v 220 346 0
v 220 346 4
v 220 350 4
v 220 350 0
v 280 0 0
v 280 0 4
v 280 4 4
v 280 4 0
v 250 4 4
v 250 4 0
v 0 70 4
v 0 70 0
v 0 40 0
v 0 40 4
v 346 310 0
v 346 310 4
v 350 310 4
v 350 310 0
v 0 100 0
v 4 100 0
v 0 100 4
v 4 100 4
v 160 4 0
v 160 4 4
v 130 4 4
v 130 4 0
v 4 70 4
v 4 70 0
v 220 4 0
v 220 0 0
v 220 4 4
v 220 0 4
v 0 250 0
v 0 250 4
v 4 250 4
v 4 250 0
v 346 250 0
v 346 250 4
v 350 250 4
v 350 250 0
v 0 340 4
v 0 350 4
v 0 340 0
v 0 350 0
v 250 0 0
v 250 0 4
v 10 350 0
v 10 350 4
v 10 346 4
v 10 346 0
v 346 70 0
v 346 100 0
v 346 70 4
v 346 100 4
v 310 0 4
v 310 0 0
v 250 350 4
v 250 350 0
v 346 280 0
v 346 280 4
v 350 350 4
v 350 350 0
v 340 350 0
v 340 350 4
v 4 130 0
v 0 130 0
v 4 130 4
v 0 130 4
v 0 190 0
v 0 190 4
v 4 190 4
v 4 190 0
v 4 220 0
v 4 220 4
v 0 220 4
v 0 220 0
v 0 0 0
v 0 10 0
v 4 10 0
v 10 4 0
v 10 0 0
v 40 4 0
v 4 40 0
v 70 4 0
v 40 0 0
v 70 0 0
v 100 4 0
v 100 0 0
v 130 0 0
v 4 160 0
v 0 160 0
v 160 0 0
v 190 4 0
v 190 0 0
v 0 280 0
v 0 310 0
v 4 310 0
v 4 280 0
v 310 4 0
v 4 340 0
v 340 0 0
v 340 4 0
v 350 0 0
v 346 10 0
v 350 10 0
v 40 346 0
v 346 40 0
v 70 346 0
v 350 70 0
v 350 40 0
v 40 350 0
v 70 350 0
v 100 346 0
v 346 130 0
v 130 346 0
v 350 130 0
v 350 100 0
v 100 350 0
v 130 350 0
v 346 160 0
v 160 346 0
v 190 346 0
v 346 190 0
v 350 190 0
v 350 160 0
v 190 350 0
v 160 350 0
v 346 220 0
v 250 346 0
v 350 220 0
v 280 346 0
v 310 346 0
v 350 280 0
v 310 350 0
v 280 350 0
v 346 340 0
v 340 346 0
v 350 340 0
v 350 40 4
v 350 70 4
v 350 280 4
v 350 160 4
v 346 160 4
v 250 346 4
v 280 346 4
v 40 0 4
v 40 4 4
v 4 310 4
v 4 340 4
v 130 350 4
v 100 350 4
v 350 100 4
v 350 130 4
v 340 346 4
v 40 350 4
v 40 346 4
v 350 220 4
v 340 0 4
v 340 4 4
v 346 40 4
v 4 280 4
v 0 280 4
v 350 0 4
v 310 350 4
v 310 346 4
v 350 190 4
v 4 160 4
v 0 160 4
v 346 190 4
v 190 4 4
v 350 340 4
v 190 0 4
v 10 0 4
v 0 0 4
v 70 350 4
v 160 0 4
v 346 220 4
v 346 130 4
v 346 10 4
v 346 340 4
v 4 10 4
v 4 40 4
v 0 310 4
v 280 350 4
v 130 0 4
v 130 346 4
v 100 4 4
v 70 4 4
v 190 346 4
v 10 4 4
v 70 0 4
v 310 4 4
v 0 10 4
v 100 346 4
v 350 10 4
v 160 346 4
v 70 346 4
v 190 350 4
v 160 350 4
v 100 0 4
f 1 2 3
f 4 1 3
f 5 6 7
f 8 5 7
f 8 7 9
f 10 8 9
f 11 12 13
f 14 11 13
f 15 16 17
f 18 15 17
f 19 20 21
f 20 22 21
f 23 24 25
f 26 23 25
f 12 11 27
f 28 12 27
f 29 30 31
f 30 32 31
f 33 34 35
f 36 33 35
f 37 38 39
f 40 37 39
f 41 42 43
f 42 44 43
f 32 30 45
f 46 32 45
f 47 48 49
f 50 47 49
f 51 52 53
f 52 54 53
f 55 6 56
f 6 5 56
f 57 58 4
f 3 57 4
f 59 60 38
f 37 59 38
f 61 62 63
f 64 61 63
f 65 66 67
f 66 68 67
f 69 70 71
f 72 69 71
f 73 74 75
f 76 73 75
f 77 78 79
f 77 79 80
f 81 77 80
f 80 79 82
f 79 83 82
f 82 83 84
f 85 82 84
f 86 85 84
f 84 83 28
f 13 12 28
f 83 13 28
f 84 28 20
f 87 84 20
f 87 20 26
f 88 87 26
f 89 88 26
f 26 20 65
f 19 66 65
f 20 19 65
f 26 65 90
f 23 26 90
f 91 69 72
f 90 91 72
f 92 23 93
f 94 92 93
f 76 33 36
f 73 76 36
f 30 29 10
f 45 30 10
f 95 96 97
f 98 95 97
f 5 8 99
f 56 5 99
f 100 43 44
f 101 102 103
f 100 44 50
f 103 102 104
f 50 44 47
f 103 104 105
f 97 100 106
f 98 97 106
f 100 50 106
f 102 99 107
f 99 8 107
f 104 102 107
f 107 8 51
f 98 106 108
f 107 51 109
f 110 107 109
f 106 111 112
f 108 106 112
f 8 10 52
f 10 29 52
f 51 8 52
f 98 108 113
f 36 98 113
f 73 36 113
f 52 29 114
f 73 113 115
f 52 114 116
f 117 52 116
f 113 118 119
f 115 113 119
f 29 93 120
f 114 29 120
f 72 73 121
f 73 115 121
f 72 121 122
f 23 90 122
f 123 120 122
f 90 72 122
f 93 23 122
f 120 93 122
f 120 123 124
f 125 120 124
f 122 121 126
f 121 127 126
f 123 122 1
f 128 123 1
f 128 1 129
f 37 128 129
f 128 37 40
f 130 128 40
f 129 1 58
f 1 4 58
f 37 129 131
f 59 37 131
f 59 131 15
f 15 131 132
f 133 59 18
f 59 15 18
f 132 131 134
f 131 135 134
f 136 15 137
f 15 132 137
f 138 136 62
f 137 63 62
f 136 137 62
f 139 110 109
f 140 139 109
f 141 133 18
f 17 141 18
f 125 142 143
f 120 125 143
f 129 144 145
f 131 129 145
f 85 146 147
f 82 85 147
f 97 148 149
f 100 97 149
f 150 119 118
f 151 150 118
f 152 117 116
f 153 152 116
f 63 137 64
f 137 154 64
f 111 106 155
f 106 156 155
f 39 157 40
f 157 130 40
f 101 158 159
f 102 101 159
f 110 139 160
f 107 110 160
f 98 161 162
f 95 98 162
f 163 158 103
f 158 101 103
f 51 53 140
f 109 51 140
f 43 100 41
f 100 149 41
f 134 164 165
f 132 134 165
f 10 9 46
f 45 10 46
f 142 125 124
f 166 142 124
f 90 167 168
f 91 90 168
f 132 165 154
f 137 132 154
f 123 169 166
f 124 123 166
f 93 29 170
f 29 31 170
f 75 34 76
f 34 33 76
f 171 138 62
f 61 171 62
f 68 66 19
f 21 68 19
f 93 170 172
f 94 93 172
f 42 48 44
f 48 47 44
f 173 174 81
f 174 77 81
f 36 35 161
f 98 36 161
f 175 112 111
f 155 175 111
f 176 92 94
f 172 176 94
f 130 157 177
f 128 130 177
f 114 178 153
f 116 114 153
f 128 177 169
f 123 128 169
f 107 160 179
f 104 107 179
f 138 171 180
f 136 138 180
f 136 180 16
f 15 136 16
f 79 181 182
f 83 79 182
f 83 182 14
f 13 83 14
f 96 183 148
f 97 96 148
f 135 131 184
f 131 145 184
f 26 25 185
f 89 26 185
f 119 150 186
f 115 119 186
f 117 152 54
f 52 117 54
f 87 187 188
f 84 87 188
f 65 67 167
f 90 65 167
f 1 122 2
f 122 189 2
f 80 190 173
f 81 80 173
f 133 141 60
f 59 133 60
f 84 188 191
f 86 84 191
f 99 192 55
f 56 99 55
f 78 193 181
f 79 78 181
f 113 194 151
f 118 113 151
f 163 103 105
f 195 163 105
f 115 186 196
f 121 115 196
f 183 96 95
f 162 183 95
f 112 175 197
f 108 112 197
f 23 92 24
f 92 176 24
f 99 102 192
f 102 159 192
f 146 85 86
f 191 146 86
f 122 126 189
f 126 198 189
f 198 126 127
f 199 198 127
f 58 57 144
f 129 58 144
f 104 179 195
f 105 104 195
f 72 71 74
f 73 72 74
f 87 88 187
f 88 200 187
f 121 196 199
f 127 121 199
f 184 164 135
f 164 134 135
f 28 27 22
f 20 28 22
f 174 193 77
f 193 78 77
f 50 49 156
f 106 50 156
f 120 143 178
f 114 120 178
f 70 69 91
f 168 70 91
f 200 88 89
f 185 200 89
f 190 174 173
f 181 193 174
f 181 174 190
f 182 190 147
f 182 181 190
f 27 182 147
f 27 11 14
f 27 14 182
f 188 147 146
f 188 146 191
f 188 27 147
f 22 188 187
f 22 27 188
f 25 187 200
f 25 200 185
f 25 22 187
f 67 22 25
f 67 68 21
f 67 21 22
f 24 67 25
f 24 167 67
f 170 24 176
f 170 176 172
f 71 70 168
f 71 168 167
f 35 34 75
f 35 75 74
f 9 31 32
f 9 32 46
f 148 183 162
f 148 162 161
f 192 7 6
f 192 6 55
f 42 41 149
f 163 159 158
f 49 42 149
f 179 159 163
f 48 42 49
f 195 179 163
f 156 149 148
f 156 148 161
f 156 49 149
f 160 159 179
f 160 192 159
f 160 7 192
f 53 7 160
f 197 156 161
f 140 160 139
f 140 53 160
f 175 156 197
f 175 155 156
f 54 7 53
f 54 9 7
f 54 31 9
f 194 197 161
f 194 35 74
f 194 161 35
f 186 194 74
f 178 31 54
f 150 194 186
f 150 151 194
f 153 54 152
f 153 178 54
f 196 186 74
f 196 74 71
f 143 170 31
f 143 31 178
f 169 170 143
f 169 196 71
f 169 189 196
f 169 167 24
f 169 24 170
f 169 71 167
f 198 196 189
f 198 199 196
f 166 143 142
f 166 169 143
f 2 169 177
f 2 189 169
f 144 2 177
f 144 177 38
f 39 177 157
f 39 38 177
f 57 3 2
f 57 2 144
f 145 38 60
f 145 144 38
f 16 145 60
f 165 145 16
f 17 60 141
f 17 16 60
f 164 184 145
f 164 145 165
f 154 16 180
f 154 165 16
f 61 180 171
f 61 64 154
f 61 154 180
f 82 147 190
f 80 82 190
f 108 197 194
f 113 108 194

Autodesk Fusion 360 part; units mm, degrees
sketch "Sketch1" plane through (0, 0, 0) normal (0, 0, 1) x (1, 0, 0)
  line L0 (0, 0) -> (350, 0)
  line L1 (350, 0) -> (350, 350)
  line L2 (350, 350) -> (0, 350)
  line L3 (0, 350) -> (0, 0)
  point P0 (175, 175)
  dimension "d1" = 350
  dimension "d2" = 350
  dimension "d7" = 175
  dimension "d8" = 175
extrude "Extrude1" add sketch "Sketch1" along normal blind 4 makes body 1
sketch "Sketch2" plane through (0, 0, 4) normal (0, 0, 1) x (-1, 0, 0)
  line L0 (0, -350) -> (0, 0)
  line L1 (-10, 0) -> (-40, 0)
  line L2 (-40, 0) -> (-40, -4)
  line L3 (-40, -4) -> (-10, -4)
  line L4 (-10, -4) -> (-10, 0)
  line L5 (0, -10) -> (-4, -10)
  line L6 (-4, -10) -> (-4, -40)
  line L7 (-4, -40) -> (0, -40)
  line L8 (0, -40) -> (0, -10)
  line L9 (0, 0) -> (-350, 0)
  dimension "d12" = 10
  dimension "d14" = 30
  dimension "d15" = 4
  dimension "d26" = 30
  dimension "d27" = 4
  dimension "d47" = 10
extrude "Extrude4" cut sketch "Sketch2" against normal through all contours L0 L5 L6 L7 L8 bodies 1
extrude "Extrude5" cut sketch "Sketch2" against normal through all contours L1 L2 L3 L4 L9 bodies 1
pattern_linear "R-Pattern1" count 6 spacing 60 along (0, 1, 0) count 2 spacing 346 along (1, 0, 0) of "Extrude4"
pattern_linear "R-Pattern2" count 6 spacing 60 along (1, 0, 0) count 2 spacing 346 along (0, 1, 0) of "Extrude5"
copy_body "Body->Comp1" bodies 1 removing the originals makes body 2 in component "Component"
component "Component" placed x (1, 0, 0) y (0, 1, 0) z (0, 0, 1) at (0, 0, 0)
equation "d1 = Linear Dimension-2"
equation "mm = 툁"
equation "d2 = d"
equation "b = 350 mm" comment "width"
equation "d = 350 mm" comment "depth"
equation "h = 290 mm" comment "height"
equation "t = 4 mm" comment "thickness"
equation "d7 = d / 2"
equation "d8 = b / 2"
equation "d9 = t"
equation "a = 30 mm"
equation "d12 = b_corner"
equation "b_corner = ( b - ( floor(b / a) * a ) ) / 2"
equation "d14 = a"
equation "d15 = t"
equation "n_b = floor(floor(b / a) / 2) + 1"
equation "d26 = a"
equation "d27 = t"
equation "d_corner = ( d - ( floor(d / a) * a ) ) / 2"
equation "n_d = floor(floor(d / a) / 2) + 1"
equation "d39 = n_d"
equation "d41 = 2 * a"
equation "d42 = b - t"
equation "d43 = n_b"
equation "d45 = 2 * a"
equation "d46 = d - t"
equation "d47 = d_corner"
